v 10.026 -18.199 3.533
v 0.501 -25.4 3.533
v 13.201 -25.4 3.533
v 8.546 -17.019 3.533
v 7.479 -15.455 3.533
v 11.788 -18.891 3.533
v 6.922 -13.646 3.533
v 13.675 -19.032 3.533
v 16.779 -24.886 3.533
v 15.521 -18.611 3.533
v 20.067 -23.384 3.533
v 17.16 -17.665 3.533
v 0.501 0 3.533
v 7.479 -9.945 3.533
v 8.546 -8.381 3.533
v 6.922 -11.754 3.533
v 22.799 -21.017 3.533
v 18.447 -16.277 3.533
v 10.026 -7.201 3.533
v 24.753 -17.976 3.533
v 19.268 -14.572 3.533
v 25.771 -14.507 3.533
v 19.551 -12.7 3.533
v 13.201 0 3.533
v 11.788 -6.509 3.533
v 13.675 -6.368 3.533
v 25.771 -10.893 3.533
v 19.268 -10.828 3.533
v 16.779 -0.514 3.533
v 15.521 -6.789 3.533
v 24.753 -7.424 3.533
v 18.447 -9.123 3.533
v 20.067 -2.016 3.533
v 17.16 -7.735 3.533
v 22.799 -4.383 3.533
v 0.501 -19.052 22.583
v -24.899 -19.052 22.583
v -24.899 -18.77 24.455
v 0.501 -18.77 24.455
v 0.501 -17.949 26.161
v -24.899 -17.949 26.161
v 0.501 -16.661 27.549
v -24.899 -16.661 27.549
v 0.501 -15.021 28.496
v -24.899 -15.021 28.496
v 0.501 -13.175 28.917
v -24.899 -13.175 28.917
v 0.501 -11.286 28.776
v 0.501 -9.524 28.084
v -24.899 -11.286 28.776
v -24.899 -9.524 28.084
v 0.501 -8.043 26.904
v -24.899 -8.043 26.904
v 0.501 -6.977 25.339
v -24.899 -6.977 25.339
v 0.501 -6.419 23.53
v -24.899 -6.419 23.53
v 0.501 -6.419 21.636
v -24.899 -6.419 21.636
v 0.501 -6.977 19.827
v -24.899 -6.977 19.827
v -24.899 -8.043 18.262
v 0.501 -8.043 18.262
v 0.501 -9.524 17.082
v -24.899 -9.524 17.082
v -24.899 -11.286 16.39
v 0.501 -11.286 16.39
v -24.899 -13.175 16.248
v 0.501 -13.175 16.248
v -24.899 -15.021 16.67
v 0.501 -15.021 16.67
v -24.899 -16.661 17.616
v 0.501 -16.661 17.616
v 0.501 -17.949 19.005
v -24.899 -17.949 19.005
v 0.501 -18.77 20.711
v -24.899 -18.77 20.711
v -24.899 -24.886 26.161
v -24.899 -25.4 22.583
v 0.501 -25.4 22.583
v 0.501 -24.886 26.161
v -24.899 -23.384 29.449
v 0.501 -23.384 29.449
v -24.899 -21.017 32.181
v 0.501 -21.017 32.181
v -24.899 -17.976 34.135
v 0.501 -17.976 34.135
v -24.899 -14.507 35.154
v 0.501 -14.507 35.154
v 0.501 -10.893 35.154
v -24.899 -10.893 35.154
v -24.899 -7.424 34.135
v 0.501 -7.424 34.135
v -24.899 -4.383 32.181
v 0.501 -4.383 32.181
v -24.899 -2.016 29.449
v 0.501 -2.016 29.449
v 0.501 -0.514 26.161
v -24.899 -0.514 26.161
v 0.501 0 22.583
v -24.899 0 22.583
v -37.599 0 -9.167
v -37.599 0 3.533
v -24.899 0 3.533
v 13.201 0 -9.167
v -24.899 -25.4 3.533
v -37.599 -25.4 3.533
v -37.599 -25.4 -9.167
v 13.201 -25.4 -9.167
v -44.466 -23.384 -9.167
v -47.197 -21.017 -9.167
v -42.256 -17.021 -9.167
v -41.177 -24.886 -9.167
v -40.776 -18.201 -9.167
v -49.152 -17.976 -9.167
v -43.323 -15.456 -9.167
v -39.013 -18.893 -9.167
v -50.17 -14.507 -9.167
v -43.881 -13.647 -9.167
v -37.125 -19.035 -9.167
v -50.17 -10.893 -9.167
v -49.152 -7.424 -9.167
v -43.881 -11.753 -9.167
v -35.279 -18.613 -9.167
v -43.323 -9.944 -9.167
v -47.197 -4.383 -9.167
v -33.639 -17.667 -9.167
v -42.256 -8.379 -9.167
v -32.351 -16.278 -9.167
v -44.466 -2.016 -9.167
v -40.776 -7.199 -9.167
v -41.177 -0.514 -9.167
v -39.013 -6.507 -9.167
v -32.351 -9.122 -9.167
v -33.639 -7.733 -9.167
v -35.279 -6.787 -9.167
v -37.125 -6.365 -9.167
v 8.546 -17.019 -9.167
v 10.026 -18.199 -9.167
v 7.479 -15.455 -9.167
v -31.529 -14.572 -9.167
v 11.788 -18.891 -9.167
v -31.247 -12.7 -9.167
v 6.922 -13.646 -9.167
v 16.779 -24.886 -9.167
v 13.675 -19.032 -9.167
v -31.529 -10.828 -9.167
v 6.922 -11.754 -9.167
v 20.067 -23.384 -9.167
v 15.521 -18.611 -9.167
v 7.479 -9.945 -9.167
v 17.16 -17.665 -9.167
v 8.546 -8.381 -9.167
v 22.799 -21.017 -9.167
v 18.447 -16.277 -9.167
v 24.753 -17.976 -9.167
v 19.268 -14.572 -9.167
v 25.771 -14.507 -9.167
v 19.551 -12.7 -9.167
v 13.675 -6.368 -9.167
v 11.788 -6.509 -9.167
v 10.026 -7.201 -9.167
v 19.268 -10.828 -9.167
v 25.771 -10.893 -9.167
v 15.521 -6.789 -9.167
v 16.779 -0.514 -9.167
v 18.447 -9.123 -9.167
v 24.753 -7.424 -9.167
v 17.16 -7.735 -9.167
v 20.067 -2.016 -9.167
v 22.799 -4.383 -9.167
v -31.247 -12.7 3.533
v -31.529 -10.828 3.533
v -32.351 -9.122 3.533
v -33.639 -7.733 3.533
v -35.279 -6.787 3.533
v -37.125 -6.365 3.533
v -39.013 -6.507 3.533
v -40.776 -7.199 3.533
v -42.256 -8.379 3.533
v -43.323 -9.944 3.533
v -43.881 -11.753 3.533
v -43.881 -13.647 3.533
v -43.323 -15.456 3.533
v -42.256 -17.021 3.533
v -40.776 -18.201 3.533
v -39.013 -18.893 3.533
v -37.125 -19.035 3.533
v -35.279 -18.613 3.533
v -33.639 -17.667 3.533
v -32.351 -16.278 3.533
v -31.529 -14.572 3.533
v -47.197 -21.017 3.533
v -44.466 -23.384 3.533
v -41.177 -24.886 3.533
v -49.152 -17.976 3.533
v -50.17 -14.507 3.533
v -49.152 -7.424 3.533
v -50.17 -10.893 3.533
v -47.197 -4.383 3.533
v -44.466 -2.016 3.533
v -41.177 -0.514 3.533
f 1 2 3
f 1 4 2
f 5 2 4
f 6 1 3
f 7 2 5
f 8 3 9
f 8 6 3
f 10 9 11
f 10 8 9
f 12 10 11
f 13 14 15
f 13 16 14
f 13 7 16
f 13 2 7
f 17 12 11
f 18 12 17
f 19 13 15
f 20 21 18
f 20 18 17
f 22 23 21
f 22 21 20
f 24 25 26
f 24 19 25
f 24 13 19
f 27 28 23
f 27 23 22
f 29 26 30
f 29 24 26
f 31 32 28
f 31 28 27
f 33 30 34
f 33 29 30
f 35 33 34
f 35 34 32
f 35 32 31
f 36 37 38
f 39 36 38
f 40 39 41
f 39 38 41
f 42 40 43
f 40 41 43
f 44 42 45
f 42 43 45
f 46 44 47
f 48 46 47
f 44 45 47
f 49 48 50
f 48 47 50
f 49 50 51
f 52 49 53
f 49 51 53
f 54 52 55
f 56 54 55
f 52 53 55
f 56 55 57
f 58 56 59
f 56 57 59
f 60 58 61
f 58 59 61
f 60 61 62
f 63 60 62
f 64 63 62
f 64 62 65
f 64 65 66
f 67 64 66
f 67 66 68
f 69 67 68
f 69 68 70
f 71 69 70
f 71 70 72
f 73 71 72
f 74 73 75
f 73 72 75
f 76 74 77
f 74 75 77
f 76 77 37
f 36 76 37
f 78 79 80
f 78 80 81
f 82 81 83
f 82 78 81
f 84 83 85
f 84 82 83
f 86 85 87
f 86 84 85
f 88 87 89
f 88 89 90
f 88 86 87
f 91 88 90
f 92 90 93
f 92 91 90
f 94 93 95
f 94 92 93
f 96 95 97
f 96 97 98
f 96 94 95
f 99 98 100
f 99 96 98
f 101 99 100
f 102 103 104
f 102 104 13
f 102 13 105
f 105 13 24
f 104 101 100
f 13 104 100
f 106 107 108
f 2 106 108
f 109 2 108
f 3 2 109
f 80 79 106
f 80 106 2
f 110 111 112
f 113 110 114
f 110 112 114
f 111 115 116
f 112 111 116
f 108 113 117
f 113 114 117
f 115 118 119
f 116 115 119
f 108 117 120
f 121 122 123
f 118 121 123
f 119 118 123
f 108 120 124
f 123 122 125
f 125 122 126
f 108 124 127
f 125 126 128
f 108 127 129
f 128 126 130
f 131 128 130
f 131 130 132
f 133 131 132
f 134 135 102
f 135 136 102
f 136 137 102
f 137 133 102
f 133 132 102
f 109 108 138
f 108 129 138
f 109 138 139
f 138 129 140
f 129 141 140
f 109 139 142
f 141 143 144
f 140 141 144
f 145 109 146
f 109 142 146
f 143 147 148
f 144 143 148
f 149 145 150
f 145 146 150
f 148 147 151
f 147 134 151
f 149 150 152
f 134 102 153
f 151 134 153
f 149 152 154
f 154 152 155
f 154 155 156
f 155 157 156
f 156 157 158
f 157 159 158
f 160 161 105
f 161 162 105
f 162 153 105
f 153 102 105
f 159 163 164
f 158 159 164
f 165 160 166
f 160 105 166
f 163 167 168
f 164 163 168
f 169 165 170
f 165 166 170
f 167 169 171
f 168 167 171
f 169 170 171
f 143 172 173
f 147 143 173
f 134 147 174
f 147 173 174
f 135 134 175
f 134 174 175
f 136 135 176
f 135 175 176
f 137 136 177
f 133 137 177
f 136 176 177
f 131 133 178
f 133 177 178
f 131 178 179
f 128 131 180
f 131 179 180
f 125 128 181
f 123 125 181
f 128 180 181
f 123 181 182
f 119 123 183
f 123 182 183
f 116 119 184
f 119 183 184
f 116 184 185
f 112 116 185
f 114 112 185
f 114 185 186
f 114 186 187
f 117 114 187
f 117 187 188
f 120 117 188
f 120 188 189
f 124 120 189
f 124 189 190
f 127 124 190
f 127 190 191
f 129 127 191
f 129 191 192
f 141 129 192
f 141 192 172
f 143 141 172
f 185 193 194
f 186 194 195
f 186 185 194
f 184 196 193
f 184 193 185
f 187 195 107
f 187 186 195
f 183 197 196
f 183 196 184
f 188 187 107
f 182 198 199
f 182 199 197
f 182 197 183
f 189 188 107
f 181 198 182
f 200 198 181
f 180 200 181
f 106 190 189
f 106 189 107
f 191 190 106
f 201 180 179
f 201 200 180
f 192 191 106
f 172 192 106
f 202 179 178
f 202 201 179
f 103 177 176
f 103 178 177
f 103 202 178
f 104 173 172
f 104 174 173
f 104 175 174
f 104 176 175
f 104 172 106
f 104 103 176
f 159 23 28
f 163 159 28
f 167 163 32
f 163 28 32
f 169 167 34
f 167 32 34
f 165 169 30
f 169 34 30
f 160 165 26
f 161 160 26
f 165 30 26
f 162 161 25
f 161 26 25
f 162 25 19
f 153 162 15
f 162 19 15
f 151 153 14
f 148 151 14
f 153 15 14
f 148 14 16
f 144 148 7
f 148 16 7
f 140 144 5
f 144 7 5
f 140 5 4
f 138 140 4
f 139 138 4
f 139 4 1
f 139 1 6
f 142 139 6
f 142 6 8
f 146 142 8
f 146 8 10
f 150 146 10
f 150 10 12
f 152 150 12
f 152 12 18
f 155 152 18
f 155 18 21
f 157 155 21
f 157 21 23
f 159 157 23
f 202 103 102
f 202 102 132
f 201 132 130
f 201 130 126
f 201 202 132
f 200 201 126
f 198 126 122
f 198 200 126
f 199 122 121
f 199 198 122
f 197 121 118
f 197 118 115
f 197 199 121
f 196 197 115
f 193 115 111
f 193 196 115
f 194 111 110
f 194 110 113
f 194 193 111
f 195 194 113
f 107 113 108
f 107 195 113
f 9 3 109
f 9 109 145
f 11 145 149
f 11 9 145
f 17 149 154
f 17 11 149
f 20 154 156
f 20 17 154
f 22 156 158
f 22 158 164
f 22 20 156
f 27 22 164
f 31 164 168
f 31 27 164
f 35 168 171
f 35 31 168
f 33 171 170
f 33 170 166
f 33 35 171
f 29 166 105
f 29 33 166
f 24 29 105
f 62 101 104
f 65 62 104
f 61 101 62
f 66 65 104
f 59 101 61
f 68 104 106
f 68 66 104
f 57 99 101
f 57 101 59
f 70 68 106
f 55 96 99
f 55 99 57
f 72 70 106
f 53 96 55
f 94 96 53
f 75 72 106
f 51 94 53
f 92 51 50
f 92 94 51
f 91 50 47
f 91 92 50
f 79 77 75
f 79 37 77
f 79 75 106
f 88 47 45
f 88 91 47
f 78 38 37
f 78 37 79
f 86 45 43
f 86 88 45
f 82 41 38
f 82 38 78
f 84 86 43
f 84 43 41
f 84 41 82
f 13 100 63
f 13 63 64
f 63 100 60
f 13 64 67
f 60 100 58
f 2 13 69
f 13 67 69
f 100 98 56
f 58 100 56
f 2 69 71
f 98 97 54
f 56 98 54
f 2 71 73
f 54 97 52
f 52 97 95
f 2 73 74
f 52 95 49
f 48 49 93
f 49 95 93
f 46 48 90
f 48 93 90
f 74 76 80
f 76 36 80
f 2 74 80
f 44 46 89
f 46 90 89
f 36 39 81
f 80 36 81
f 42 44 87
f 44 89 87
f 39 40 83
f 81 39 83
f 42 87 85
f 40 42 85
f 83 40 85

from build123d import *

# Parameters (mm, degrees)
F1_DEPTH  = 25.4
F3_DEPTH  = 12.7
F5_DEPTH  = 12.7
F7_DEPTH  = 25.4
F8_R      = 6.352316
F9_DEPTH  = 25.4
F10_R     = 6.352482
F12_DEPTH = 25.4
F11_R     = 6.35
F13_DEPTH = 25.4


with BuildPart() as f1:
    # F0 (on Front) → F1 (new body)
    with BuildSketch(Plane.XZ):
        Polygon((-37.59941, 3.532893), (-37.59941, -9.167107), (13.20059, -9.167107), (13.20059, 3.532893), (0.50059, 3.532893), (0.50059, 22.582893), (-24.89941, 22.582893), (-24.89941, 3.532893), align=None)
    extrude(amount=F1_DEPTH)

    # F2 (on face) → F3 (join)
    with BuildSketch(Plane.XY.offset(3.532893)):
        with BuildLine():
            Line((13.20059, 0), (13.20059, -25.4))
            ThreePointArc((13.20059, -25.4), (25.90059, -12.7), (13.20059, 0))
        make_face()
    extrude(amount=-F3_DEPTH)

    # F4 (on face) → F5 (join)
    with BuildSketch(Plane.XY.offset(3.532893)):
        with BuildLine():
            Line((-37.59941, -25.4), (-37.59941, 0))
            ThreePointArc((-37.59941, 0), (-50.29941, -12.7), (-37.59941, -25.4))
        make_face()
    extrude(amount=-F5_DEPTH)

    # F6 (on face) → F7 (join)
    with BuildSketch(Plane(origin=(-24.89941, 0, 0), x_dir=(0, -1, 0), z_dir=(-1, 0, 0))):
        with BuildLine():
            Line((0, 22.582893), (25.4, 22.582893))
            ThreePointArc((25.4, 22.582893), (12.7, 35.282893), (0, 22.582893))
        make_face()
    extrude(amount=-F7_DEPTH)

    # F8 (on face) → F9 (cut)
    with BuildSketch(Plane(origin=(-24.89941, 0, 0), x_dir=(0, -1, 0), z_dir=(-1, 0, 0))):
        with Locations((12.7, 22.582893)):
            Circle(F8_R)
    extrude(amount=-F9_DEPTH, mode=Mode.SUBTRACT)

    # F10 (on face) → F12 (cut)
    with BuildSketch(Plane.XY.offset(3.532893)):
        with Locations((-37.59941, -12.7)):
            Circle(F10_R)
    extrude(amount=-F12_DEPTH, mode=Mode.SUBTRACT)

    # F11 (on face) → F13 (cut)
    with BuildSketch(Plane.XY.offset(3.532893)):
        with Locations((13.20059, -12.7)):
            Circle(F11_R)
    extrude(amount=-F13_DEPTH, mode=Mode.SUBTRACT)


solid = f1.part
